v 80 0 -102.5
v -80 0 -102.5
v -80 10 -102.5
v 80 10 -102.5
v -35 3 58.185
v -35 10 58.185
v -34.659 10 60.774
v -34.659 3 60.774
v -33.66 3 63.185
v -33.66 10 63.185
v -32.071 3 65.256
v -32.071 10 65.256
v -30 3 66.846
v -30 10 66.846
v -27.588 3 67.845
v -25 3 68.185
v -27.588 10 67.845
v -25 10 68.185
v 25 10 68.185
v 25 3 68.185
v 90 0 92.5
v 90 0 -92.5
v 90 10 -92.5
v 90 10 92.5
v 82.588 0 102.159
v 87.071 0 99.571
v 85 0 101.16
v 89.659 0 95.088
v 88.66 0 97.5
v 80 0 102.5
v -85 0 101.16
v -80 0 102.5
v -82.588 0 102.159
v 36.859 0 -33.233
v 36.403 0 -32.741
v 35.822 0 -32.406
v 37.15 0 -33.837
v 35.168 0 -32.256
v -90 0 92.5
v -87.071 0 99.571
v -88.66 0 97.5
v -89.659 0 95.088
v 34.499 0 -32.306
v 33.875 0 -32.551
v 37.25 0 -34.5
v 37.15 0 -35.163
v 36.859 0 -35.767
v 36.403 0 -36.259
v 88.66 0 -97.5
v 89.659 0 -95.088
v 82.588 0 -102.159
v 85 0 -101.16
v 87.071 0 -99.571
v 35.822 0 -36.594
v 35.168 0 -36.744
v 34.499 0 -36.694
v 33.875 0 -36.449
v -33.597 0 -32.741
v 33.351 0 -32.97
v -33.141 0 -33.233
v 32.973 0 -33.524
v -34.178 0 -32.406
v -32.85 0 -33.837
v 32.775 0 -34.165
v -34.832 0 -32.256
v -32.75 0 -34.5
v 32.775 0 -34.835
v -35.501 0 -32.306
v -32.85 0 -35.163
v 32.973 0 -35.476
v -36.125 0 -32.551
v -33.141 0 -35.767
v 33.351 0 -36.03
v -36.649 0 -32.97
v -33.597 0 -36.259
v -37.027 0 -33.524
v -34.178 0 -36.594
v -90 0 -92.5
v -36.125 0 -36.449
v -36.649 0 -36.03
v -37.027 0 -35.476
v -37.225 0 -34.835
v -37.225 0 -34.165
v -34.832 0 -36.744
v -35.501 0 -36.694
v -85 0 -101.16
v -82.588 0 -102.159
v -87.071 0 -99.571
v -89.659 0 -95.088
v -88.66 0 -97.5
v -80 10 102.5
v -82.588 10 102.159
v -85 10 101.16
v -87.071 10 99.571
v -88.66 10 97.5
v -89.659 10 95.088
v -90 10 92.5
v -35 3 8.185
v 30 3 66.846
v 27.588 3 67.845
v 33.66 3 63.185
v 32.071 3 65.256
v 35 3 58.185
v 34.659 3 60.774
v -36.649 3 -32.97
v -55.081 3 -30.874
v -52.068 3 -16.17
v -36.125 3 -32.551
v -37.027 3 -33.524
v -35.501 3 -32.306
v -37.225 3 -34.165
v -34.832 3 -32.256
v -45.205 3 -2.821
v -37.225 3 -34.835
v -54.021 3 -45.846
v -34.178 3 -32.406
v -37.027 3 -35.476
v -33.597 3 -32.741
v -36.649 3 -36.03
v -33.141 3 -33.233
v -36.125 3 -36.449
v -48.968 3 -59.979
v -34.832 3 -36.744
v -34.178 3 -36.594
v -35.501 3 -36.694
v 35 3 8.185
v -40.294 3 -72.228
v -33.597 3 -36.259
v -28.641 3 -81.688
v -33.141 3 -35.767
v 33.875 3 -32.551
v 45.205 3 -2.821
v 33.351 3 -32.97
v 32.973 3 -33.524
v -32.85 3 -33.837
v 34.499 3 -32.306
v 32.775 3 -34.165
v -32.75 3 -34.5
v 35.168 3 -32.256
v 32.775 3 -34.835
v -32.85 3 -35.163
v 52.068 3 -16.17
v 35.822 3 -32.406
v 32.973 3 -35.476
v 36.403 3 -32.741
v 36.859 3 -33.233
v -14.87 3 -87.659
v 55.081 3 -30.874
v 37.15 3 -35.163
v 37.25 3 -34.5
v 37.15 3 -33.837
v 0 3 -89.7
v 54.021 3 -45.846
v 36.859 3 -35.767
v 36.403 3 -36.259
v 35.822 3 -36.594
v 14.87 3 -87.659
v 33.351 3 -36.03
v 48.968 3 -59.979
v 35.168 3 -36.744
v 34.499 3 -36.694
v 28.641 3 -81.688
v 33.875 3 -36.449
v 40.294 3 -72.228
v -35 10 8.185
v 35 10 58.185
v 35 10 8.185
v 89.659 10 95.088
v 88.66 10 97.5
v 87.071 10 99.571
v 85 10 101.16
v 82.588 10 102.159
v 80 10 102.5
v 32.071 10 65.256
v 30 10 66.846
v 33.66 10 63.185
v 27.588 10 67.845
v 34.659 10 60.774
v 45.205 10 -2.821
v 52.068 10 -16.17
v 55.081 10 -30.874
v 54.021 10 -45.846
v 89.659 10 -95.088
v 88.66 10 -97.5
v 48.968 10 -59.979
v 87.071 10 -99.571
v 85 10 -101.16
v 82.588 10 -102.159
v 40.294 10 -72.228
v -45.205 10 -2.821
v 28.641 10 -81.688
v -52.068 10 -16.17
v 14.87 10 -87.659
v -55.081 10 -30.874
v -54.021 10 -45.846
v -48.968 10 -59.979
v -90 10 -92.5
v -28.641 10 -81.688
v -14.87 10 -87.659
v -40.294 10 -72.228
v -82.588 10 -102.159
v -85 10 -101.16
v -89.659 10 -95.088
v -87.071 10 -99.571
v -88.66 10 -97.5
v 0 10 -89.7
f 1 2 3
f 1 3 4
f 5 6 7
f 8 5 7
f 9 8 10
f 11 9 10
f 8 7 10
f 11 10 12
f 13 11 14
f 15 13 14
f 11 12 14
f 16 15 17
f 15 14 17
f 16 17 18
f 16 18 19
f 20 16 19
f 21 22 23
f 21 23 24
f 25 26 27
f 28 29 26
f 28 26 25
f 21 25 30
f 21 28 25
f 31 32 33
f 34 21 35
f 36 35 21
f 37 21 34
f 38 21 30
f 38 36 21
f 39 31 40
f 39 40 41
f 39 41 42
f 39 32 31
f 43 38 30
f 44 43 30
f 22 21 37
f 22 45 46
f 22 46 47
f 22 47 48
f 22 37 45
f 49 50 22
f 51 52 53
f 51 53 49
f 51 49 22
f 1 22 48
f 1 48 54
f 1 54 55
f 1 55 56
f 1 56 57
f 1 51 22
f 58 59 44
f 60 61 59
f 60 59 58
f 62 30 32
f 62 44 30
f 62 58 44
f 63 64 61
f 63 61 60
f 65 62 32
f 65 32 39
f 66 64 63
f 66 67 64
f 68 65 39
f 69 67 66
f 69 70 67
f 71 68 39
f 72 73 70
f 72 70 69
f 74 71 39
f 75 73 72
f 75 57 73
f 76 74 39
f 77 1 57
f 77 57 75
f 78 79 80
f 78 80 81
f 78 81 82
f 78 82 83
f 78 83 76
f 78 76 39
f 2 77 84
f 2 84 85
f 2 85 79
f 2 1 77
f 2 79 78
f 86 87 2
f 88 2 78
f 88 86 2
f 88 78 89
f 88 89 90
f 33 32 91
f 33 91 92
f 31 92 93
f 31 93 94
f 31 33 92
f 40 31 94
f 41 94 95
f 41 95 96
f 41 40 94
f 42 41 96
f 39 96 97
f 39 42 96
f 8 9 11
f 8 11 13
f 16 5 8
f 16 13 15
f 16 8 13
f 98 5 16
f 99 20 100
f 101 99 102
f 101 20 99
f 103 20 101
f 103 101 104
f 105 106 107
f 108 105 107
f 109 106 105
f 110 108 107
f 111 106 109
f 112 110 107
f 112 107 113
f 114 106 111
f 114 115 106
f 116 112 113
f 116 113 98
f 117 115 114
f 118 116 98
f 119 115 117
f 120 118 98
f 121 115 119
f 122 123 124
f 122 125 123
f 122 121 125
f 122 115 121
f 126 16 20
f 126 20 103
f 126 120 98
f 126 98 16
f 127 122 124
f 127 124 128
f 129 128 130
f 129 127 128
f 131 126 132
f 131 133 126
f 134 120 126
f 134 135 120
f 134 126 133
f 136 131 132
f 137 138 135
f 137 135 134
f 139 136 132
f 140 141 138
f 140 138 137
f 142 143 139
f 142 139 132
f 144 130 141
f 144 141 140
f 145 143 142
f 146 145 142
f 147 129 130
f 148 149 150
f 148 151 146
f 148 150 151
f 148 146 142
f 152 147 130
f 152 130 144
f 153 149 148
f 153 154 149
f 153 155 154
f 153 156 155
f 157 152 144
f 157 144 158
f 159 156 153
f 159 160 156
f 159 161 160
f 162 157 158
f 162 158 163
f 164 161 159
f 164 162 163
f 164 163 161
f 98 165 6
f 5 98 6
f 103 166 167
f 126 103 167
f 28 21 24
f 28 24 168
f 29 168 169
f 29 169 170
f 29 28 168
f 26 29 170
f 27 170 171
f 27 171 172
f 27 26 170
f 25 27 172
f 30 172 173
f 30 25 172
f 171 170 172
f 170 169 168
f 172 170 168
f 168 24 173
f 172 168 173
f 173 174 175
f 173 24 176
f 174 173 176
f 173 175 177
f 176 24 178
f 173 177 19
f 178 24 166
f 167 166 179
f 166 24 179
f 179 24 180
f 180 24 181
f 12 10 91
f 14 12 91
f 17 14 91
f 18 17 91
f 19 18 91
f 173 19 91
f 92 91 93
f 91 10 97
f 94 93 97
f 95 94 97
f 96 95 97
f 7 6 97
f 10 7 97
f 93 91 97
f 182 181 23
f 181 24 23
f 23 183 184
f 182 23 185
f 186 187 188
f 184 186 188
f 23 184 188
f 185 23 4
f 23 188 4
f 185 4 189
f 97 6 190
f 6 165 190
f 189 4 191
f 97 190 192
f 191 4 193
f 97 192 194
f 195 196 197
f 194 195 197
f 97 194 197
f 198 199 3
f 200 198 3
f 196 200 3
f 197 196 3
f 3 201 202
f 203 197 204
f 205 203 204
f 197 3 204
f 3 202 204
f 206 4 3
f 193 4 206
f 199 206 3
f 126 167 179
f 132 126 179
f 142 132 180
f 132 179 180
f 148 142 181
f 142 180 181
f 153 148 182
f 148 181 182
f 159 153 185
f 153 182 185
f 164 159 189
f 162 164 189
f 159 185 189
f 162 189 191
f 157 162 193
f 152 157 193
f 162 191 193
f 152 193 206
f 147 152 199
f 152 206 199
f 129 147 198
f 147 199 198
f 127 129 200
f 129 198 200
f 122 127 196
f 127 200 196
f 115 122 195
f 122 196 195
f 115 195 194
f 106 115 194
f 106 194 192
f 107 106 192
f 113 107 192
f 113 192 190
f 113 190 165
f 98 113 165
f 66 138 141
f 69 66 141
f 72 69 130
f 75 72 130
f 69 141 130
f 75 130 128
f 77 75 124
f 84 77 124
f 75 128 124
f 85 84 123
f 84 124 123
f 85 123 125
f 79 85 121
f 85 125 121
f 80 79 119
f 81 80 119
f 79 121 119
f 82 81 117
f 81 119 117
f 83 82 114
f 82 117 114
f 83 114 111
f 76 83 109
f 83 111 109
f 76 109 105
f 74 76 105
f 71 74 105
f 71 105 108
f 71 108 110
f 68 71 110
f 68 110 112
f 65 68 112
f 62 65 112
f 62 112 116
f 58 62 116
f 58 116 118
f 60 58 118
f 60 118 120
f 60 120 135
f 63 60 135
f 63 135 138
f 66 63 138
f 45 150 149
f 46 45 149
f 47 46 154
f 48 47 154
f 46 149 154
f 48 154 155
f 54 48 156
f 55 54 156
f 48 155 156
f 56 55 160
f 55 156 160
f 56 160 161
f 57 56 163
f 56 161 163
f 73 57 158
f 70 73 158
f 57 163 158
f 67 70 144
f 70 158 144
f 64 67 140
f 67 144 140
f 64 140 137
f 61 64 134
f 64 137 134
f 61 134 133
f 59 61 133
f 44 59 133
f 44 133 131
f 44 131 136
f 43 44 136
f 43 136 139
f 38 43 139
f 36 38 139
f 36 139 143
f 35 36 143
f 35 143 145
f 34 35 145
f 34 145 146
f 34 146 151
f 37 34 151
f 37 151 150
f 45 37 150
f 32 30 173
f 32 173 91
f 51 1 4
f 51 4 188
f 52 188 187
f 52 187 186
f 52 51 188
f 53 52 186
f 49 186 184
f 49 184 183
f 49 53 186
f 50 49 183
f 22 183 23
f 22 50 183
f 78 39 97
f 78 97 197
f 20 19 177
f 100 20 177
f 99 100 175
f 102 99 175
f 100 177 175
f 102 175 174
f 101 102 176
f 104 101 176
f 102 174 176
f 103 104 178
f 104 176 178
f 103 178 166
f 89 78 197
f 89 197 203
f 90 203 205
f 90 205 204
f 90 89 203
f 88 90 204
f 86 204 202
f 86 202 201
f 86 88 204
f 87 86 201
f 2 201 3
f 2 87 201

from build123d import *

# Parameters (mm, degrees)
BOSS_EXTRU_1_DEPTH      = 10
ENL_V_MAT_EXTRU_1_DEPTH = 7
D_GAGEMENT_M41_D        = 4.5
D_GAGEMENT_M41_DEPTH    = 10
D_GAGEMENT_M41_TIP      = 1.351936393


with BuildPart() as part:
    # Esquisse2 → Boss.-Extru.1 (new body)
    with BuildSketch(Plane(origin=(0, 0, 0), x_dir=(1, 0, 0), z_dir=(0, 1, 0))):
        with BuildLine():
            Line((-80, 102.5), (80, 102.5))
            ThreePointArc((80, 102.5), (87.071067812, 99.571067812), (90, 92.5))
            Line((90, 92.5), (90, -92.5))
            ThreePointArc((90, -92.5), (87.071067812, -99.571067812), (80, -102.5))
            Line((80, -102.5), (-80, -102.5))
            ThreePointArc((-80, -102.5), (-87.071067812, -99.571067812), (-90, -92.5))
            Line((-90, -92.5), (-90, 92.5))
            ThreePointArc((-90, 92.5), (-87.071067812, 99.571067812), (-80, 102.5))
        make_face()
    extrude(amount=BOSS_EXTRU_1_DEPTH)

    # Esquisse3 → Enlèv. mat.-Extru.1 (cut)
    with BuildSketch(Plane(origin=(0, 10, 0), x_dir=(1, 0, 0), z_dir=(0, 1, 0))):
        with BuildLine():
            Line((-35, -8.185360488), (-35, -58.185360488))
            ThreePointArc((-35, -58.185360488), (-32.071067812, -65.2564283), (-25, -68.185360488))
            Line((-25, -68.185360488), (25, -68.185360488))
            ThreePointArc((25, -68.185360488), (32.071067812, -65.2564283), (35, -58.185360488))
            Line((35, -58.185360488), (35, -8.185360488))
            ThreePointArc((35, -8.185360488), (0, 89.7), (-35, -8.185360488))
        make_face()
    extrude(amount=-ENL_V_MAT_EXTRU_1_DEPTH, mode=Mode.SUBTRACT)

    # Dégagement M41
    with Locations(Plane(origin=(0, 0, 0), x_dir=(-1, 0, 0), z_dir=(0, -1, 0))):
        with Locations((35, 34.5), (-35, 34.5)):
            Hole(D_GAGEMENT_M41_D / 2, depth=D_GAGEMENT_M41_DEPTH)
            with Locations((0, 0, -(D_GAGEMENT_M41_DEPTH + D_GAGEMENT_M41_TIP / 2))):  # 118° drill point
                Cone(0, D_GAGEMENT_M41_D / 2, D_GAGEMENT_M41_TIP, mode=Mode.SUBTRACT)


solid = part.part
